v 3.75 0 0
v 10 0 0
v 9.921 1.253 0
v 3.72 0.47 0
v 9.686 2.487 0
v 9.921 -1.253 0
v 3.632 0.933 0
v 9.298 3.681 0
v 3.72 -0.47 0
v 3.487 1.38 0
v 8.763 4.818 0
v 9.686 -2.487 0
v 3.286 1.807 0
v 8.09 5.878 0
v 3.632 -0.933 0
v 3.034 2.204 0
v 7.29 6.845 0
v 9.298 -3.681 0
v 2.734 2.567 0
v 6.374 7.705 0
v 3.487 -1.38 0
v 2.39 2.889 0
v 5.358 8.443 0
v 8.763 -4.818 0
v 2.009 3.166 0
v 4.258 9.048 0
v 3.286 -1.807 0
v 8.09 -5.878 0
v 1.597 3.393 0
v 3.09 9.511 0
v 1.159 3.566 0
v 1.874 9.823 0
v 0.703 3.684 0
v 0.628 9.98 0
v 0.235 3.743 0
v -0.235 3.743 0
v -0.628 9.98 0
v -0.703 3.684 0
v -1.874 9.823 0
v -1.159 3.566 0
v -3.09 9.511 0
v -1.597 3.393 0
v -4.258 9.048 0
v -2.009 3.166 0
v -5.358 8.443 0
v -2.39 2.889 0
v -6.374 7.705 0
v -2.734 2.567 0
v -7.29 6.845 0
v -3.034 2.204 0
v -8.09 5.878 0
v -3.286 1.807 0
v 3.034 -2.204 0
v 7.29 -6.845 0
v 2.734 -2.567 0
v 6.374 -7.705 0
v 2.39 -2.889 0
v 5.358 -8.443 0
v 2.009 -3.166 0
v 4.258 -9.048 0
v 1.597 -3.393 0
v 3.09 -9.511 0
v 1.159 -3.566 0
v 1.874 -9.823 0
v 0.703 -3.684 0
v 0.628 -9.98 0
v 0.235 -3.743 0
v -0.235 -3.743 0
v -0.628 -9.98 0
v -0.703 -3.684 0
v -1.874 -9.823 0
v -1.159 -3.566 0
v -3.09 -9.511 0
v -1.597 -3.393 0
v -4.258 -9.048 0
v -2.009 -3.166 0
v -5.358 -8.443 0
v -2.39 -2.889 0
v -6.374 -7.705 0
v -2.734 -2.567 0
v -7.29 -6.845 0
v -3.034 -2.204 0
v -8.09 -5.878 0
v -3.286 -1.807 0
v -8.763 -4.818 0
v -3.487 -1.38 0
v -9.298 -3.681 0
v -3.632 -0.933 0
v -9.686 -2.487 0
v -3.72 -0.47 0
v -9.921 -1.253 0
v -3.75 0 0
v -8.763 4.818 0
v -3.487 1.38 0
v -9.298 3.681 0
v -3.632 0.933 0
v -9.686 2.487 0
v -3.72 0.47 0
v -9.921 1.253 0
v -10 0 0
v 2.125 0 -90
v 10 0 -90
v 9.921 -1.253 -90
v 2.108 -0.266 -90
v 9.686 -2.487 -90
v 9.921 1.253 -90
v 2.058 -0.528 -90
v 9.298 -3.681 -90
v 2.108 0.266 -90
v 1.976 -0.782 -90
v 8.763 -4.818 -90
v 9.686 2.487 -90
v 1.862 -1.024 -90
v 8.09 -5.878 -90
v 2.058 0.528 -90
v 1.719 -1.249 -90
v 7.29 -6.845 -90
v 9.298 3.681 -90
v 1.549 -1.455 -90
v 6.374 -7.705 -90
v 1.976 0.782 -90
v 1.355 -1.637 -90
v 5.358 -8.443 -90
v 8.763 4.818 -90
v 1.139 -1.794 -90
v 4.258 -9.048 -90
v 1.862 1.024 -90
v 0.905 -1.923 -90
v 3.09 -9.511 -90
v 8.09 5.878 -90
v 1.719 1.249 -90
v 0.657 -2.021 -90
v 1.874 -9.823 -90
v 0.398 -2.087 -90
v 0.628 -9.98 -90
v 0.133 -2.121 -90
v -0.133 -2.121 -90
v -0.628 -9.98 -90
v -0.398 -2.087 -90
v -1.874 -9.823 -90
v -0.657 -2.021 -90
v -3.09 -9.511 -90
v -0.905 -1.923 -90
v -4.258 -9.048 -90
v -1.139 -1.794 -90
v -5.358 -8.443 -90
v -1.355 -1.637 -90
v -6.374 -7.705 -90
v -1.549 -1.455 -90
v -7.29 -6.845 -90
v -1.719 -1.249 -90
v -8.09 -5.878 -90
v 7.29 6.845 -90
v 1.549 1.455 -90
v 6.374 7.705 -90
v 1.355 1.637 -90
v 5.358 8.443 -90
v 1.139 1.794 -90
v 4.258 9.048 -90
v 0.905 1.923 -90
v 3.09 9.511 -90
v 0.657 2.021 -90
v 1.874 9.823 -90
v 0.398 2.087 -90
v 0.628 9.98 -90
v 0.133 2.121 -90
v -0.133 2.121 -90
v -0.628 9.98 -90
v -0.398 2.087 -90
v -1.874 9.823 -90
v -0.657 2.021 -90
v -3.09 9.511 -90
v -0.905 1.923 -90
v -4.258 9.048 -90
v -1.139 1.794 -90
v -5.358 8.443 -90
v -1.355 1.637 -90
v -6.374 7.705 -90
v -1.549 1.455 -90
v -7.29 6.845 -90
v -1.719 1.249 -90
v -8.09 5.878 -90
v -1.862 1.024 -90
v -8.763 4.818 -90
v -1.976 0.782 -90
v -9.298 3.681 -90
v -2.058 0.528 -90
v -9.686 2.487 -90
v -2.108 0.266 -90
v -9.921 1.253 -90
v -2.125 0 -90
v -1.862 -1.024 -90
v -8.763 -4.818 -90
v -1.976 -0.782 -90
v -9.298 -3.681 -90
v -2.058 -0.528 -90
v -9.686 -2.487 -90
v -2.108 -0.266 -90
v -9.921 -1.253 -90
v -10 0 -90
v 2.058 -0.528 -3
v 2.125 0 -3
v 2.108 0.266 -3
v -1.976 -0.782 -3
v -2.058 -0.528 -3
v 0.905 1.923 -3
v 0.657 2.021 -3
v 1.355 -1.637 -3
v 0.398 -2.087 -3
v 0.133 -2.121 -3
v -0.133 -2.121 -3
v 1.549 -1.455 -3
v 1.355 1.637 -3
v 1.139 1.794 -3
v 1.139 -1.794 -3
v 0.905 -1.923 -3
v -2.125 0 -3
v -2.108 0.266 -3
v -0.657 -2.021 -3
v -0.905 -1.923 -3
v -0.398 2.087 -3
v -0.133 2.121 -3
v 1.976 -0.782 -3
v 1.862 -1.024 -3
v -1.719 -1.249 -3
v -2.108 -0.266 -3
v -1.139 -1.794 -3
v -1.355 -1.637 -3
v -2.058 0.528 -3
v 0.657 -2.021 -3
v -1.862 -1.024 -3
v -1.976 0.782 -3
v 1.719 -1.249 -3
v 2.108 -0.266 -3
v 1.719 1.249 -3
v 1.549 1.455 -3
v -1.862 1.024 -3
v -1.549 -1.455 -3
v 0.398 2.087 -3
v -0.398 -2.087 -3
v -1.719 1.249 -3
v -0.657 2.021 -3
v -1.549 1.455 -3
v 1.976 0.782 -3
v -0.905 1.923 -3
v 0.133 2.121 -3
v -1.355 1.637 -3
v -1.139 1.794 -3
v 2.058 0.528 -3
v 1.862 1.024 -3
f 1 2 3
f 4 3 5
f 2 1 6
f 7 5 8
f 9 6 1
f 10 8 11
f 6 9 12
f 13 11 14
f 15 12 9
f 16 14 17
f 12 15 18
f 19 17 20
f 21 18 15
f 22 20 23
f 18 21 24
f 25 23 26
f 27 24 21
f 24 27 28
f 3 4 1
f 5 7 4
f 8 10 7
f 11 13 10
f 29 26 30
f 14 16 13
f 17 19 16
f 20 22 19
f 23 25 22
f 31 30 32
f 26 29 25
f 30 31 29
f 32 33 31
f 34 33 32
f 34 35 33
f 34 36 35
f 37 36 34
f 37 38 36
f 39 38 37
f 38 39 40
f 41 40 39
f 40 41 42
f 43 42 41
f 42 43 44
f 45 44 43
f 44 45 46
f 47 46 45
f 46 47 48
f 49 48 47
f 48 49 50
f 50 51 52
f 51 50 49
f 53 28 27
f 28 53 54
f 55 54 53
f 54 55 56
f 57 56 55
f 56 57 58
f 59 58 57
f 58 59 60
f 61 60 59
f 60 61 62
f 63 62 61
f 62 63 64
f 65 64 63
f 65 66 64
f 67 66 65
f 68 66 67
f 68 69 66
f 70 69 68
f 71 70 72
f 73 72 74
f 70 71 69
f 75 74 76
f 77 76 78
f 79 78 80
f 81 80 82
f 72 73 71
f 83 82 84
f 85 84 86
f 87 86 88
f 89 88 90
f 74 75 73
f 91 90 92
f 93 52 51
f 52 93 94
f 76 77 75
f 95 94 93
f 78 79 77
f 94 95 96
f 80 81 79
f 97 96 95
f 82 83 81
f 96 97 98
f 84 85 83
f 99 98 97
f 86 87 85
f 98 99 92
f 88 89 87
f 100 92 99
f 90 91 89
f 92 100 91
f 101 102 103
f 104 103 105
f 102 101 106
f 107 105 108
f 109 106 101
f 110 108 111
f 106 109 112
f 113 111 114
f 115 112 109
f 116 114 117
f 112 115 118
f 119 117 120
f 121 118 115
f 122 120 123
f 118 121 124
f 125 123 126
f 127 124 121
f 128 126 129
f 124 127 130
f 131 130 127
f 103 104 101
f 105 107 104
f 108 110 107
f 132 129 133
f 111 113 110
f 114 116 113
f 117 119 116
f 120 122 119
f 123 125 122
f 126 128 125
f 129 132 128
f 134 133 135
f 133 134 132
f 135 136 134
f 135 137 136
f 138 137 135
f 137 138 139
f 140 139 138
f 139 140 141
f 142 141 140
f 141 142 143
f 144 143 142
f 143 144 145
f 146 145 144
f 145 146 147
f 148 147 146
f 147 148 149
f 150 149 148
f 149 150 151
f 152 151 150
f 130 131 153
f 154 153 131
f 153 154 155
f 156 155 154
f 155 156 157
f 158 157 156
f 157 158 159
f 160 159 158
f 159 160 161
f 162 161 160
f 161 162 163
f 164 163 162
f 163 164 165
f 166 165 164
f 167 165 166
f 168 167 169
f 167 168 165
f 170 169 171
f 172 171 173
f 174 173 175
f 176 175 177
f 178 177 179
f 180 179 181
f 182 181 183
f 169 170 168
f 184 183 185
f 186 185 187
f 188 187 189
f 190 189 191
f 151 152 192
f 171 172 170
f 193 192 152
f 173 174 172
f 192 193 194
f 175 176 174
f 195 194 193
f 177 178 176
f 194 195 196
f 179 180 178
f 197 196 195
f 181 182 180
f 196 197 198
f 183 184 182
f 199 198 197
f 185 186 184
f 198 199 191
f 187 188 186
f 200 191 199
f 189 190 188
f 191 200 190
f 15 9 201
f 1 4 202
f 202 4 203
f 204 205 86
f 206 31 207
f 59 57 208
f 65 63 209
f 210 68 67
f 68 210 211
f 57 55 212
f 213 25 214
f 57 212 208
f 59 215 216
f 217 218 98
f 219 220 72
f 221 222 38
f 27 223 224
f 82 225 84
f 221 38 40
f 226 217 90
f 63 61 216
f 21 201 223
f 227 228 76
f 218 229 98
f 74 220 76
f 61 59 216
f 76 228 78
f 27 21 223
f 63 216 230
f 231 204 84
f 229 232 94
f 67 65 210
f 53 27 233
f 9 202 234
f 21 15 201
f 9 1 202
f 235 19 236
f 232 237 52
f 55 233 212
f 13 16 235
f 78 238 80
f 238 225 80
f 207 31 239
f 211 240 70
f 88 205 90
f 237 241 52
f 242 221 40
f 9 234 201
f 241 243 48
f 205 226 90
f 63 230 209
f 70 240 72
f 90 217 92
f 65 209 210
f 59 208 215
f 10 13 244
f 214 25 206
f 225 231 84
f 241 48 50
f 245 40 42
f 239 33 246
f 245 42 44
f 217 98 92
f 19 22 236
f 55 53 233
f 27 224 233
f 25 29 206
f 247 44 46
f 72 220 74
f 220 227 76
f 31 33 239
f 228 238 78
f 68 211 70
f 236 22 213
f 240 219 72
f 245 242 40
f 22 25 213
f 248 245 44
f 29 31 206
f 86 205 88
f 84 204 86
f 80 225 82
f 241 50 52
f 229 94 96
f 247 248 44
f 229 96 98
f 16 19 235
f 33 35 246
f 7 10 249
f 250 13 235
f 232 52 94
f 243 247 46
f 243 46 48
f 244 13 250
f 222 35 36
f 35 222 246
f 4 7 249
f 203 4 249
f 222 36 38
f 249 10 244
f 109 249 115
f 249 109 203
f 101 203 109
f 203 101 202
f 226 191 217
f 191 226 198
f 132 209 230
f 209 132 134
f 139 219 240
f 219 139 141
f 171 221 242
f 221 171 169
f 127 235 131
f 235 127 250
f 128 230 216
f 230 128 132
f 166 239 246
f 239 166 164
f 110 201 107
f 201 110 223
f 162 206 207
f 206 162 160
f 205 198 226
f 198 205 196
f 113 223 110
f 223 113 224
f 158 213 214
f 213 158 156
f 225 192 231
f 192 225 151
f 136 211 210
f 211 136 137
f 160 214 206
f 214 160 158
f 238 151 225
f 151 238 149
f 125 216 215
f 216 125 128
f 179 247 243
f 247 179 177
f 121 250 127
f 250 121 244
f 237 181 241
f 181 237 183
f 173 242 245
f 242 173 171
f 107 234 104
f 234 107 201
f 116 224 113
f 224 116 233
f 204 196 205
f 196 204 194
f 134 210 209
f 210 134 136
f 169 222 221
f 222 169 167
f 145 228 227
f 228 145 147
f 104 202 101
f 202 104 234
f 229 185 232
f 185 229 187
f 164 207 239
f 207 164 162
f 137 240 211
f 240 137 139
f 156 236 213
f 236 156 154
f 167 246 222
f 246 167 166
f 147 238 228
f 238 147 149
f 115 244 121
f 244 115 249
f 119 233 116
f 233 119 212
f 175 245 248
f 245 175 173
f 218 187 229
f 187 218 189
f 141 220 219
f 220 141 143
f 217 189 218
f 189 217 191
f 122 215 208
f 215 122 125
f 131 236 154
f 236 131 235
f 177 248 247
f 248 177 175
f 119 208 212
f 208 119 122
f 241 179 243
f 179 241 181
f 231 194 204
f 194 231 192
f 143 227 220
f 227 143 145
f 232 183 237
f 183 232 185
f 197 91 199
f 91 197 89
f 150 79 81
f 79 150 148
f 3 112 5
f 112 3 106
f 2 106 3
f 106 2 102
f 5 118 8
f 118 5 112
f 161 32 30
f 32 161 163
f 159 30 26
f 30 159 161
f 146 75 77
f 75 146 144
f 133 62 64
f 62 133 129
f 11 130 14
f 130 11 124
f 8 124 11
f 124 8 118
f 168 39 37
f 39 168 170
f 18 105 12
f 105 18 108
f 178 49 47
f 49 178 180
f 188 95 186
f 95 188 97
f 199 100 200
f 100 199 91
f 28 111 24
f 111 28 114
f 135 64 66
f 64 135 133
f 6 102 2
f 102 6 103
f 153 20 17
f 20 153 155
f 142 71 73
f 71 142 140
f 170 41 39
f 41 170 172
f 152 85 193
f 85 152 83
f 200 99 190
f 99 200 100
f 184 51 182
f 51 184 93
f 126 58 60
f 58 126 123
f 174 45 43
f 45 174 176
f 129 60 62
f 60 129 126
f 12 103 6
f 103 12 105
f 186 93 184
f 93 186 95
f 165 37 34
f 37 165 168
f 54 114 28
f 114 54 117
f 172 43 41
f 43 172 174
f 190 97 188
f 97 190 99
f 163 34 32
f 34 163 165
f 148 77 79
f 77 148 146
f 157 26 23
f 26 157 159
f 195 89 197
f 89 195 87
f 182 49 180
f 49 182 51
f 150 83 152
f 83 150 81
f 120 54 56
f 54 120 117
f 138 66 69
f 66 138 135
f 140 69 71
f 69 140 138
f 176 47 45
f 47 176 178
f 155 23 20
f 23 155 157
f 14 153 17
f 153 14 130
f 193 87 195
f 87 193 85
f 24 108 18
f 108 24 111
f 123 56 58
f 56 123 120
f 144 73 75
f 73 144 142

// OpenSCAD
$fn = 50;


difference() {
	union() {
		translate(v = [0, 0, -90.0000000000]) {
			cylinder(h = 90, r = 10.0000000000);
		}
		cylinder(h = 0, r = 19.0000000000);
	}
	union() {
		translate(v = [0, 0, 0]) {
			rotate(a = [0, 0, 0]) {
				difference() {
					union() {
						#translate(v = [0, 0, -90.0000000000]) {
							cylinder(h = 90, r = 2.0000000000);
						}
						#translate(v = [0, 0, -3]) {
							cylinder(h = 3, r = 10.0000000000, r1 = 2.1250000000, r2 = 3.7500000000);
						}
						#translate(v = [0, 0, -90.0000000000]) {
							cylinder(h = 90, r = 2.1250000000);
						}
						#translate(v = [0, 0, -90.0000000000]) {
							cylinder(h = 90, r = 2.0000000000);
						}
					}
					union();
				}
			}
		}
	}
}
